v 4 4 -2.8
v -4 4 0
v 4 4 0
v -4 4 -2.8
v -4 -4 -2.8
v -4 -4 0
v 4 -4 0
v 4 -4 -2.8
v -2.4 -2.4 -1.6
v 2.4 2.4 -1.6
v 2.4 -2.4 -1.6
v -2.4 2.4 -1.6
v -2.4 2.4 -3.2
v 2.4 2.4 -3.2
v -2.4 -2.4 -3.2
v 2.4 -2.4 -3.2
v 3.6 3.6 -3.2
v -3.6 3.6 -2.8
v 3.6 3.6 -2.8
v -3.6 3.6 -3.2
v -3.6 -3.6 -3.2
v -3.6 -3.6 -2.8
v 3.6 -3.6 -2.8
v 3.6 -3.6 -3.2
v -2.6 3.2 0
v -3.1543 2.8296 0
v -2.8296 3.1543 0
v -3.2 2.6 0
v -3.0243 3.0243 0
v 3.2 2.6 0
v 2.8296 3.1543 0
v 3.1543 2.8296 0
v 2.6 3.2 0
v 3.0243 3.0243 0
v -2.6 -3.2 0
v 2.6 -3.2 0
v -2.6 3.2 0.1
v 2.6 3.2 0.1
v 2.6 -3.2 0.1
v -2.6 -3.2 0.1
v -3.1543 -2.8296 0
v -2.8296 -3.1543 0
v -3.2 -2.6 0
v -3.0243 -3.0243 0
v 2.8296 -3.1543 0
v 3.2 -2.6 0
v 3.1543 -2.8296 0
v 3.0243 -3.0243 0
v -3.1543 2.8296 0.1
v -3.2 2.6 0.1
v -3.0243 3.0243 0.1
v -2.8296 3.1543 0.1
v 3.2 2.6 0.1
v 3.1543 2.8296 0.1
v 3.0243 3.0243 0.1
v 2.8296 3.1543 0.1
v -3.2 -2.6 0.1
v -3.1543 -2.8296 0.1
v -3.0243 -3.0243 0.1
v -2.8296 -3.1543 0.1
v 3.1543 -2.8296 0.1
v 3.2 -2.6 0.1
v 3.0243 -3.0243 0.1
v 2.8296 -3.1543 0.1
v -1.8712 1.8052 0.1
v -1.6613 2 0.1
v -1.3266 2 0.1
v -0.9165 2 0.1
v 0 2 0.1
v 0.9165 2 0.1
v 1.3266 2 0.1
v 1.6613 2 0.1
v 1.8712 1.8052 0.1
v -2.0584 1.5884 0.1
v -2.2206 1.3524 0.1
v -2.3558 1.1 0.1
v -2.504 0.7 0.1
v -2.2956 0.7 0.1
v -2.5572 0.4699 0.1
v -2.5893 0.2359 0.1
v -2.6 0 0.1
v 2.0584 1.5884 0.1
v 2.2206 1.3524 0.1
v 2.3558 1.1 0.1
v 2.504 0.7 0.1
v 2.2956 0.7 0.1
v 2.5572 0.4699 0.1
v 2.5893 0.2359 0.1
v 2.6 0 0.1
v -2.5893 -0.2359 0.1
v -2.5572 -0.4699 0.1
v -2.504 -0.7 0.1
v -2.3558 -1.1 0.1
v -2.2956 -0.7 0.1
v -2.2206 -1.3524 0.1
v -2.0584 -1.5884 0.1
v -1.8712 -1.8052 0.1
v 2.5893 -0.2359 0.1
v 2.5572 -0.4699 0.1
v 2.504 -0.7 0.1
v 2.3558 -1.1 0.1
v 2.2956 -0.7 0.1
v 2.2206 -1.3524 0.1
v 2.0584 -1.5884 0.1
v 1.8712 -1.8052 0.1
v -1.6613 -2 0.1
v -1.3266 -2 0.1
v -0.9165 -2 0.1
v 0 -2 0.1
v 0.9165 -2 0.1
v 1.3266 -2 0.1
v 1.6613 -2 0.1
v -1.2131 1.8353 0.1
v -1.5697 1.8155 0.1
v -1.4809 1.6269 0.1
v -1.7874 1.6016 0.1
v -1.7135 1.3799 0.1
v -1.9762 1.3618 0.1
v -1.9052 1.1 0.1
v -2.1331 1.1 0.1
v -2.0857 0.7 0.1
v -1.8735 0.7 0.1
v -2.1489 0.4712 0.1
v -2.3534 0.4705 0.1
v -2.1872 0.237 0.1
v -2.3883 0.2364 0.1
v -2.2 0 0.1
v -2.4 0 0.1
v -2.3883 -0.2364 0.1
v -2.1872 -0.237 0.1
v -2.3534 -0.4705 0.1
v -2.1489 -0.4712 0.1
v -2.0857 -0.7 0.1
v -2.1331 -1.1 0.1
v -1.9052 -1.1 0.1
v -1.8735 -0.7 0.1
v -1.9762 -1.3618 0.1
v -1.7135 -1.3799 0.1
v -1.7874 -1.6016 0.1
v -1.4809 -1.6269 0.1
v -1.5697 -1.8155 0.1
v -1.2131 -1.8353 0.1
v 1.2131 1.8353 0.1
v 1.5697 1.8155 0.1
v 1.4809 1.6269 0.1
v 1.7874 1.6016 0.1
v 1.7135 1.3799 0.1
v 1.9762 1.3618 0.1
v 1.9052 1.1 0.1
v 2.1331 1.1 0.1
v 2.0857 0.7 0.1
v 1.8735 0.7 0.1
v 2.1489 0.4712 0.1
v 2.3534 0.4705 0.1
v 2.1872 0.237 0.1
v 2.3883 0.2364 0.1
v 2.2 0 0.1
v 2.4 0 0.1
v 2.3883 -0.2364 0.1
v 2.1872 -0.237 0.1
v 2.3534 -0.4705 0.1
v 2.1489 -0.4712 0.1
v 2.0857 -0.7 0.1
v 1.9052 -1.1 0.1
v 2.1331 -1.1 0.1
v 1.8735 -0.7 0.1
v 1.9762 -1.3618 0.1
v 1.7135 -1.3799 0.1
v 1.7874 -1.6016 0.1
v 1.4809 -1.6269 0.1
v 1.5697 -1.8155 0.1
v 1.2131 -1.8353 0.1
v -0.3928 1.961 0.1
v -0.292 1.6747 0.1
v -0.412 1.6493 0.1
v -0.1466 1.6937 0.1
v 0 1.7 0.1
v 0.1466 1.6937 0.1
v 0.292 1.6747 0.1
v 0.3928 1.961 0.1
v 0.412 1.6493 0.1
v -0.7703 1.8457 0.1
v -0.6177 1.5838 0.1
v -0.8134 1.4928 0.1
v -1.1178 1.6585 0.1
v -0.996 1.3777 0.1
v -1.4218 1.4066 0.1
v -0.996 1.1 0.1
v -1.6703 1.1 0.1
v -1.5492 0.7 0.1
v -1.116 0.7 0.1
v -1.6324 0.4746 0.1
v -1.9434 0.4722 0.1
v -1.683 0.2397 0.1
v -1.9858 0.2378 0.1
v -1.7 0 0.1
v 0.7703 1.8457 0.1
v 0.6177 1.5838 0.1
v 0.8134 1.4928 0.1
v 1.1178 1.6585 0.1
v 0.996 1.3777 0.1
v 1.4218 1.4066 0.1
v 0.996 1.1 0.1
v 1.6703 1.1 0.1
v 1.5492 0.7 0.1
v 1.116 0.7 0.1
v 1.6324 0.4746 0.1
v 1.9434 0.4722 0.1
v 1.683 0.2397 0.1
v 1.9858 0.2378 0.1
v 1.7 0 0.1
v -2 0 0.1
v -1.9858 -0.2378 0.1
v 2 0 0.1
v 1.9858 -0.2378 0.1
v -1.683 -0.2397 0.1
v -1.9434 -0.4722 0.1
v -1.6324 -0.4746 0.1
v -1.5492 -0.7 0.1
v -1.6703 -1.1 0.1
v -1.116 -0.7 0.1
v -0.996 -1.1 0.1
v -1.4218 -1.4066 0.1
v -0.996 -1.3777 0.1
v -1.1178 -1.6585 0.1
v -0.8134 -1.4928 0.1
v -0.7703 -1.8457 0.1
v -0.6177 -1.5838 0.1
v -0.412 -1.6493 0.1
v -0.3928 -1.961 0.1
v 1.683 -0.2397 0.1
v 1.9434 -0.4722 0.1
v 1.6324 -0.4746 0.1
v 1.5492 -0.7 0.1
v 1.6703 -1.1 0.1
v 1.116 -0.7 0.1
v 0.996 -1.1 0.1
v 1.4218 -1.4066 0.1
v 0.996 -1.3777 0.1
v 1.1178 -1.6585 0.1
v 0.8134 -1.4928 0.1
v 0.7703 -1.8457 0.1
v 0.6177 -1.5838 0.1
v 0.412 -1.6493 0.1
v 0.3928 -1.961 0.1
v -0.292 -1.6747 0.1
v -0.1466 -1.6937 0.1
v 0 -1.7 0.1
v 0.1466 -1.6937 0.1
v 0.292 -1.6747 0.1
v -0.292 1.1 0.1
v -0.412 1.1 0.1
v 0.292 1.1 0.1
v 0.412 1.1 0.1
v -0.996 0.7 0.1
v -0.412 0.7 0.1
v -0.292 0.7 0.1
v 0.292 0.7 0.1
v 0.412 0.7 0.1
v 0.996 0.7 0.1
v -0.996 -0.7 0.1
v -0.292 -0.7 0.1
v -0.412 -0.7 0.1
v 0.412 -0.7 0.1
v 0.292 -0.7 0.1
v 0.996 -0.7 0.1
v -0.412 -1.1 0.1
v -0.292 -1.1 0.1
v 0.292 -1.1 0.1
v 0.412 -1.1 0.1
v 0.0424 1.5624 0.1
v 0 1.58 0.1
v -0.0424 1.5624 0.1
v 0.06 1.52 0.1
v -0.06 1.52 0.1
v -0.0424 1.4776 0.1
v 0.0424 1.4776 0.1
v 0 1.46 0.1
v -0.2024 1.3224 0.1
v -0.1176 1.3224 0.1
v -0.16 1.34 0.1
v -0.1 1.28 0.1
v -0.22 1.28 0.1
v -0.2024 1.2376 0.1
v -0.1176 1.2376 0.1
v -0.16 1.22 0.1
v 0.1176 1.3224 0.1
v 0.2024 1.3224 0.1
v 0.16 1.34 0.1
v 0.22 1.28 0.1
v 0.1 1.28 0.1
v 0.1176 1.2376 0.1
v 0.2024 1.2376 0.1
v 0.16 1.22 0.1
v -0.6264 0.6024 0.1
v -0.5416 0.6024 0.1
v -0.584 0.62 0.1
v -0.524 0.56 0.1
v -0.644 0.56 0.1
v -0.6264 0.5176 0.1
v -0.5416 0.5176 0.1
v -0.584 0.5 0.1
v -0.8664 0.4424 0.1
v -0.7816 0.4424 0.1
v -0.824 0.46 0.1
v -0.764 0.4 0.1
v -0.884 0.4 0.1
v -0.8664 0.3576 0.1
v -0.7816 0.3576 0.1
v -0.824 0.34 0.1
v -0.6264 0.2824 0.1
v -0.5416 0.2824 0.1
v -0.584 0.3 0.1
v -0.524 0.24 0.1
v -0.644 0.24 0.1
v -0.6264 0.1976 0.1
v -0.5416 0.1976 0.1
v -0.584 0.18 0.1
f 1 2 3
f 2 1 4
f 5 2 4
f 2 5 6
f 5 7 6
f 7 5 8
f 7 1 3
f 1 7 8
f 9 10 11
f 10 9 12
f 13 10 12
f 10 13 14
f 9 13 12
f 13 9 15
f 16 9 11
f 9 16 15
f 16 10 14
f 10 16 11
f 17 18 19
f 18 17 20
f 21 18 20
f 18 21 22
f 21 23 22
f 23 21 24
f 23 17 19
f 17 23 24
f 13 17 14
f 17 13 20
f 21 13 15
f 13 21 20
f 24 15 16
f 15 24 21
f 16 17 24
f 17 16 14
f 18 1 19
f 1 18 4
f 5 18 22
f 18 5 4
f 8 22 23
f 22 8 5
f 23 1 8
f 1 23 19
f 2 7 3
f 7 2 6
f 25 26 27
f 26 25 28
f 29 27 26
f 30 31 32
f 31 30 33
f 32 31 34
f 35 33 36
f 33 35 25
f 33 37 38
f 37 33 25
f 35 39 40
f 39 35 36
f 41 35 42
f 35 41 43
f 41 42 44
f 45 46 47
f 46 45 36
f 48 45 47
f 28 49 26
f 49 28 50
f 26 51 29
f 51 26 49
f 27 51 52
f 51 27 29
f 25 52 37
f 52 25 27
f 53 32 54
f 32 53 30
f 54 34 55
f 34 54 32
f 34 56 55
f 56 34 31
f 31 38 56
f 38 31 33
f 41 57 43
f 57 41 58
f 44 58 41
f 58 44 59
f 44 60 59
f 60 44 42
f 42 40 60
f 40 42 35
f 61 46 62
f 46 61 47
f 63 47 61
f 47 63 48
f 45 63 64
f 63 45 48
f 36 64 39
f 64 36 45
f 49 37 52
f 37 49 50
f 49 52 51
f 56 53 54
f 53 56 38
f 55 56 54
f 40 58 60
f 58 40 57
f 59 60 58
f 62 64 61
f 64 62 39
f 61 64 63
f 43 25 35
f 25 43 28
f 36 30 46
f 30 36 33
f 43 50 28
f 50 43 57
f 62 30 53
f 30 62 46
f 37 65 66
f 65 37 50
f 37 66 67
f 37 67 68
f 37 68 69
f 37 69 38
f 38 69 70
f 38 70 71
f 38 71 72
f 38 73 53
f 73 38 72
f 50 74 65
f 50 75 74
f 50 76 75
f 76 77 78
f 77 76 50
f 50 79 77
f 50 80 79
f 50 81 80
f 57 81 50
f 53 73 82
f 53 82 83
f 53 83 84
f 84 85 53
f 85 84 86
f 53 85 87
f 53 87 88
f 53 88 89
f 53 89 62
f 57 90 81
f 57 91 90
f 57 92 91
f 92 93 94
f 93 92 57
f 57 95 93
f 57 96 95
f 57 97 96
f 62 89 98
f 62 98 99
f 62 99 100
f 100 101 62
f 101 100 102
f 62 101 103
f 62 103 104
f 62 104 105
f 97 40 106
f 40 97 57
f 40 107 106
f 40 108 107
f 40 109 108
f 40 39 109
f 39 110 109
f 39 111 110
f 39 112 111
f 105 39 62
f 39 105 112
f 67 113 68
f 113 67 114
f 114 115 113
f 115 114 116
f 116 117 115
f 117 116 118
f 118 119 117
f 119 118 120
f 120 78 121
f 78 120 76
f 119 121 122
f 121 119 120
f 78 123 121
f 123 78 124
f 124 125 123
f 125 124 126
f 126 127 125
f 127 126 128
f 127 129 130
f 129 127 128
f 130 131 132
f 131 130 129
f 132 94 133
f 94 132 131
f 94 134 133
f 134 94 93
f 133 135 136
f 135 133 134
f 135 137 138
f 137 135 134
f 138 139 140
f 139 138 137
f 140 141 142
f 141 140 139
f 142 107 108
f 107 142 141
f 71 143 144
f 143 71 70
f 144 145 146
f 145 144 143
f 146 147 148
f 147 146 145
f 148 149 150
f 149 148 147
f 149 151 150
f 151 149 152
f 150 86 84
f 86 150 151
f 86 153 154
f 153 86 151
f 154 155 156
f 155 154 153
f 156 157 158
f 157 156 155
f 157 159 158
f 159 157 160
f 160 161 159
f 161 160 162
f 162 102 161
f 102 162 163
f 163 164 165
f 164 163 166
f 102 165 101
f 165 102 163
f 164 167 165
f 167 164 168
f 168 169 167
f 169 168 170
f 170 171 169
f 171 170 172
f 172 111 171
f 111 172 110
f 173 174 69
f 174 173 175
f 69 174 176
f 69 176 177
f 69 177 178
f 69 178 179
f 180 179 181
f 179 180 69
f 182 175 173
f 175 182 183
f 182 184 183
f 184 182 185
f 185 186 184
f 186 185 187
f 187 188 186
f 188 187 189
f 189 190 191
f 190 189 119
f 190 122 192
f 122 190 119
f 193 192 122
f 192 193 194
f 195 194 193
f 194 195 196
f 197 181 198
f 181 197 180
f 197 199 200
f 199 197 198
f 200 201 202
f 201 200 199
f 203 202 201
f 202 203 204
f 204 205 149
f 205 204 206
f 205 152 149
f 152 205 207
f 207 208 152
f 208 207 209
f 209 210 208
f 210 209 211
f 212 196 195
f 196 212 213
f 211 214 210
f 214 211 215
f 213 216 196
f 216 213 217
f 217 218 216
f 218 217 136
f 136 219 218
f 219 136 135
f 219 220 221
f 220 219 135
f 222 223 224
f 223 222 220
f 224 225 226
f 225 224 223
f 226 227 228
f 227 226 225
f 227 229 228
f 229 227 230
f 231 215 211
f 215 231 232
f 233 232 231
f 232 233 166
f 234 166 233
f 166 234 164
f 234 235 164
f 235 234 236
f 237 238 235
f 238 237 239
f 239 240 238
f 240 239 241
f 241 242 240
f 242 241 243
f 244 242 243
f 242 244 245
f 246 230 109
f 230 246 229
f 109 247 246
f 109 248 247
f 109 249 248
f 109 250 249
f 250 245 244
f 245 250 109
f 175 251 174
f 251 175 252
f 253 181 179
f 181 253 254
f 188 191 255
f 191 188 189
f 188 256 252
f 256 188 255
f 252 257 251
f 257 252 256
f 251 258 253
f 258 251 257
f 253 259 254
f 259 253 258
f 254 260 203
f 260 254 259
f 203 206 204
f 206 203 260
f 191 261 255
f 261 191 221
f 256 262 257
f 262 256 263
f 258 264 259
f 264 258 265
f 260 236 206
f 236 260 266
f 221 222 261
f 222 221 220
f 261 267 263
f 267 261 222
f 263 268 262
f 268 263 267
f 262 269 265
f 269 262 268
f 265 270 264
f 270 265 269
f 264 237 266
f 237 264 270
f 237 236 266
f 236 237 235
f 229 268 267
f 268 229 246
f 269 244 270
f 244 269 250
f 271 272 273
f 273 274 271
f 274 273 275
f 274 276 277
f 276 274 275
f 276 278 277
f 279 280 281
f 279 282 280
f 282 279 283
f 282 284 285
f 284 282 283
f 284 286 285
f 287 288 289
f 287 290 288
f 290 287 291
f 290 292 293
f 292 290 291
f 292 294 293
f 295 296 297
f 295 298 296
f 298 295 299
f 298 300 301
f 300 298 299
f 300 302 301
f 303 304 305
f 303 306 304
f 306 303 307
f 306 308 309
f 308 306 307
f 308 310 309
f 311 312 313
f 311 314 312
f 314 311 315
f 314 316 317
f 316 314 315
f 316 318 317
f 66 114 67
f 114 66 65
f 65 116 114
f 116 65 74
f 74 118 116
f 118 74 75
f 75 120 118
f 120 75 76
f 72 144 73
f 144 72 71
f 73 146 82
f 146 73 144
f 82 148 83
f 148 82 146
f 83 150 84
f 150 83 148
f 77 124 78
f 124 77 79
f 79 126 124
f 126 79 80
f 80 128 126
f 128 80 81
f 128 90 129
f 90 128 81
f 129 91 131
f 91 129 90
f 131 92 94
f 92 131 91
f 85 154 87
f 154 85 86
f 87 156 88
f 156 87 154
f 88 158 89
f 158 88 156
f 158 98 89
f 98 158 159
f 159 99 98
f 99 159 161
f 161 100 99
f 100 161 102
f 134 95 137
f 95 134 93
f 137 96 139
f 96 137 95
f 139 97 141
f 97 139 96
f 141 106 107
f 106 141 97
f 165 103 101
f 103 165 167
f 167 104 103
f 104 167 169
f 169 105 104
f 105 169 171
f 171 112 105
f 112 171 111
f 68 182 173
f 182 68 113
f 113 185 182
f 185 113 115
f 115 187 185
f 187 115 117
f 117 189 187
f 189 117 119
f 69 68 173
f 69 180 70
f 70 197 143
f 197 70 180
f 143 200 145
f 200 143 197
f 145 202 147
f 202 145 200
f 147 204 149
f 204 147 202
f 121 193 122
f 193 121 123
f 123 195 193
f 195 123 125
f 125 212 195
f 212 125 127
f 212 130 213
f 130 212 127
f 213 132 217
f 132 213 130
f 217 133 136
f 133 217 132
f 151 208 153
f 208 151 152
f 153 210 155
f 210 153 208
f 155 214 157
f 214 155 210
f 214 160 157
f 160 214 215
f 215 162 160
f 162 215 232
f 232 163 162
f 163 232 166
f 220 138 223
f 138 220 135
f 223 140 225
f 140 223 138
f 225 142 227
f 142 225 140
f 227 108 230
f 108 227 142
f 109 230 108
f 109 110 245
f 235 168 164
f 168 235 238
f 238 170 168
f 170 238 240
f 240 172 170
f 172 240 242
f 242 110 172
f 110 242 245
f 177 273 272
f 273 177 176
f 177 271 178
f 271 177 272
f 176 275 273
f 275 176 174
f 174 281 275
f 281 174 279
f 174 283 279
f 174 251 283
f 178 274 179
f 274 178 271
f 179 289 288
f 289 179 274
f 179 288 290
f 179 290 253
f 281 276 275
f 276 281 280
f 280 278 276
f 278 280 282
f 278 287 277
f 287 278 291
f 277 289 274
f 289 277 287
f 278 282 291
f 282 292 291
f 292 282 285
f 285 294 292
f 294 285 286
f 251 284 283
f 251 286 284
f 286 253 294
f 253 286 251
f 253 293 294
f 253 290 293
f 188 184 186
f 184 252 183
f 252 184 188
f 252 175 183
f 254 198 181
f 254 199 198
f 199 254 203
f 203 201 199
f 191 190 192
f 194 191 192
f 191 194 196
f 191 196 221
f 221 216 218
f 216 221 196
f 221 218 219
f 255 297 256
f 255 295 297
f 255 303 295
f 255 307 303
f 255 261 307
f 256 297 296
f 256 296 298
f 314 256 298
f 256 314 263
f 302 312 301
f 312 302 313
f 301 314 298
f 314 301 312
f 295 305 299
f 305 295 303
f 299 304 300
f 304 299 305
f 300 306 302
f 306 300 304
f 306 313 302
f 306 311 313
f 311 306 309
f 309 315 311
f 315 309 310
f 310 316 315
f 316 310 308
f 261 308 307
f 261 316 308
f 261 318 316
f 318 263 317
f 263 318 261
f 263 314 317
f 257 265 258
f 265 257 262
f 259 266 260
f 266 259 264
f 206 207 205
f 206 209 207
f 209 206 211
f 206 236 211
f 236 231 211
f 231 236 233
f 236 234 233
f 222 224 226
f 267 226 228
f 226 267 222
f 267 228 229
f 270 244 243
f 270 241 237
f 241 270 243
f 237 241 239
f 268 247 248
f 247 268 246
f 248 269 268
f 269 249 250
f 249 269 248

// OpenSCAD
use <../lib.scad>
use <3070b.scad>
use <6142617v.scad>
function ldraw_lib__3070bd0g() = [
// 0 Tile  1 x  1 with Headlamp on Black Background Sticker
// 0 Name: 3070bd0g.dat
// 0 Author: Alfred Schmitz [AlfredS]
// 0 !LDRAW_ORG Shortcut UPDATE 2026-09
// 0 !LICENSE Licensed under CC BY 4.0 : see CAreadme.txt
// 
// 0 BFC CERTIFY CCW
  [0,"BFC","CERTIFY"],
  [0,"BFC","CCW"],
// 
// 0 !CATEGORY Sticker Shortcut
// 0 !KEYWORDS Camaro, Chevrolet, Drag, Race, Set 75874, Speed Champions
// 
// 0 !HISTORY 2026-09-30 [OrionP] Official Update 2026-09
// 
// 1 16 0 0 0 1 0 0 0 1 0 0 0 1 3070b.dat
  [1,16,0,0,0,1,0,0,0,1,0,0,0,1, ldraw_lib__3070b()],
// 1 16 0 0 0 1 0 0 0 1 0 0 0 1 6142617v.dat
  [1,16,0,0,0,1,0,0,0,1,0,0,0,1, ldraw_lib__6142617v()],
];
module ldraw_lib__3070bd0g(step=0, col=false, unit=2/5, alt=false, line=0.2, solid=!$preview)
    makepoly(ldraw_lib__3070bd0g(), step=step, col=col, unit=unit, alt=alt, line=line, solid=solid);
ldraw_lib__3070bd0g(line=0.2);
